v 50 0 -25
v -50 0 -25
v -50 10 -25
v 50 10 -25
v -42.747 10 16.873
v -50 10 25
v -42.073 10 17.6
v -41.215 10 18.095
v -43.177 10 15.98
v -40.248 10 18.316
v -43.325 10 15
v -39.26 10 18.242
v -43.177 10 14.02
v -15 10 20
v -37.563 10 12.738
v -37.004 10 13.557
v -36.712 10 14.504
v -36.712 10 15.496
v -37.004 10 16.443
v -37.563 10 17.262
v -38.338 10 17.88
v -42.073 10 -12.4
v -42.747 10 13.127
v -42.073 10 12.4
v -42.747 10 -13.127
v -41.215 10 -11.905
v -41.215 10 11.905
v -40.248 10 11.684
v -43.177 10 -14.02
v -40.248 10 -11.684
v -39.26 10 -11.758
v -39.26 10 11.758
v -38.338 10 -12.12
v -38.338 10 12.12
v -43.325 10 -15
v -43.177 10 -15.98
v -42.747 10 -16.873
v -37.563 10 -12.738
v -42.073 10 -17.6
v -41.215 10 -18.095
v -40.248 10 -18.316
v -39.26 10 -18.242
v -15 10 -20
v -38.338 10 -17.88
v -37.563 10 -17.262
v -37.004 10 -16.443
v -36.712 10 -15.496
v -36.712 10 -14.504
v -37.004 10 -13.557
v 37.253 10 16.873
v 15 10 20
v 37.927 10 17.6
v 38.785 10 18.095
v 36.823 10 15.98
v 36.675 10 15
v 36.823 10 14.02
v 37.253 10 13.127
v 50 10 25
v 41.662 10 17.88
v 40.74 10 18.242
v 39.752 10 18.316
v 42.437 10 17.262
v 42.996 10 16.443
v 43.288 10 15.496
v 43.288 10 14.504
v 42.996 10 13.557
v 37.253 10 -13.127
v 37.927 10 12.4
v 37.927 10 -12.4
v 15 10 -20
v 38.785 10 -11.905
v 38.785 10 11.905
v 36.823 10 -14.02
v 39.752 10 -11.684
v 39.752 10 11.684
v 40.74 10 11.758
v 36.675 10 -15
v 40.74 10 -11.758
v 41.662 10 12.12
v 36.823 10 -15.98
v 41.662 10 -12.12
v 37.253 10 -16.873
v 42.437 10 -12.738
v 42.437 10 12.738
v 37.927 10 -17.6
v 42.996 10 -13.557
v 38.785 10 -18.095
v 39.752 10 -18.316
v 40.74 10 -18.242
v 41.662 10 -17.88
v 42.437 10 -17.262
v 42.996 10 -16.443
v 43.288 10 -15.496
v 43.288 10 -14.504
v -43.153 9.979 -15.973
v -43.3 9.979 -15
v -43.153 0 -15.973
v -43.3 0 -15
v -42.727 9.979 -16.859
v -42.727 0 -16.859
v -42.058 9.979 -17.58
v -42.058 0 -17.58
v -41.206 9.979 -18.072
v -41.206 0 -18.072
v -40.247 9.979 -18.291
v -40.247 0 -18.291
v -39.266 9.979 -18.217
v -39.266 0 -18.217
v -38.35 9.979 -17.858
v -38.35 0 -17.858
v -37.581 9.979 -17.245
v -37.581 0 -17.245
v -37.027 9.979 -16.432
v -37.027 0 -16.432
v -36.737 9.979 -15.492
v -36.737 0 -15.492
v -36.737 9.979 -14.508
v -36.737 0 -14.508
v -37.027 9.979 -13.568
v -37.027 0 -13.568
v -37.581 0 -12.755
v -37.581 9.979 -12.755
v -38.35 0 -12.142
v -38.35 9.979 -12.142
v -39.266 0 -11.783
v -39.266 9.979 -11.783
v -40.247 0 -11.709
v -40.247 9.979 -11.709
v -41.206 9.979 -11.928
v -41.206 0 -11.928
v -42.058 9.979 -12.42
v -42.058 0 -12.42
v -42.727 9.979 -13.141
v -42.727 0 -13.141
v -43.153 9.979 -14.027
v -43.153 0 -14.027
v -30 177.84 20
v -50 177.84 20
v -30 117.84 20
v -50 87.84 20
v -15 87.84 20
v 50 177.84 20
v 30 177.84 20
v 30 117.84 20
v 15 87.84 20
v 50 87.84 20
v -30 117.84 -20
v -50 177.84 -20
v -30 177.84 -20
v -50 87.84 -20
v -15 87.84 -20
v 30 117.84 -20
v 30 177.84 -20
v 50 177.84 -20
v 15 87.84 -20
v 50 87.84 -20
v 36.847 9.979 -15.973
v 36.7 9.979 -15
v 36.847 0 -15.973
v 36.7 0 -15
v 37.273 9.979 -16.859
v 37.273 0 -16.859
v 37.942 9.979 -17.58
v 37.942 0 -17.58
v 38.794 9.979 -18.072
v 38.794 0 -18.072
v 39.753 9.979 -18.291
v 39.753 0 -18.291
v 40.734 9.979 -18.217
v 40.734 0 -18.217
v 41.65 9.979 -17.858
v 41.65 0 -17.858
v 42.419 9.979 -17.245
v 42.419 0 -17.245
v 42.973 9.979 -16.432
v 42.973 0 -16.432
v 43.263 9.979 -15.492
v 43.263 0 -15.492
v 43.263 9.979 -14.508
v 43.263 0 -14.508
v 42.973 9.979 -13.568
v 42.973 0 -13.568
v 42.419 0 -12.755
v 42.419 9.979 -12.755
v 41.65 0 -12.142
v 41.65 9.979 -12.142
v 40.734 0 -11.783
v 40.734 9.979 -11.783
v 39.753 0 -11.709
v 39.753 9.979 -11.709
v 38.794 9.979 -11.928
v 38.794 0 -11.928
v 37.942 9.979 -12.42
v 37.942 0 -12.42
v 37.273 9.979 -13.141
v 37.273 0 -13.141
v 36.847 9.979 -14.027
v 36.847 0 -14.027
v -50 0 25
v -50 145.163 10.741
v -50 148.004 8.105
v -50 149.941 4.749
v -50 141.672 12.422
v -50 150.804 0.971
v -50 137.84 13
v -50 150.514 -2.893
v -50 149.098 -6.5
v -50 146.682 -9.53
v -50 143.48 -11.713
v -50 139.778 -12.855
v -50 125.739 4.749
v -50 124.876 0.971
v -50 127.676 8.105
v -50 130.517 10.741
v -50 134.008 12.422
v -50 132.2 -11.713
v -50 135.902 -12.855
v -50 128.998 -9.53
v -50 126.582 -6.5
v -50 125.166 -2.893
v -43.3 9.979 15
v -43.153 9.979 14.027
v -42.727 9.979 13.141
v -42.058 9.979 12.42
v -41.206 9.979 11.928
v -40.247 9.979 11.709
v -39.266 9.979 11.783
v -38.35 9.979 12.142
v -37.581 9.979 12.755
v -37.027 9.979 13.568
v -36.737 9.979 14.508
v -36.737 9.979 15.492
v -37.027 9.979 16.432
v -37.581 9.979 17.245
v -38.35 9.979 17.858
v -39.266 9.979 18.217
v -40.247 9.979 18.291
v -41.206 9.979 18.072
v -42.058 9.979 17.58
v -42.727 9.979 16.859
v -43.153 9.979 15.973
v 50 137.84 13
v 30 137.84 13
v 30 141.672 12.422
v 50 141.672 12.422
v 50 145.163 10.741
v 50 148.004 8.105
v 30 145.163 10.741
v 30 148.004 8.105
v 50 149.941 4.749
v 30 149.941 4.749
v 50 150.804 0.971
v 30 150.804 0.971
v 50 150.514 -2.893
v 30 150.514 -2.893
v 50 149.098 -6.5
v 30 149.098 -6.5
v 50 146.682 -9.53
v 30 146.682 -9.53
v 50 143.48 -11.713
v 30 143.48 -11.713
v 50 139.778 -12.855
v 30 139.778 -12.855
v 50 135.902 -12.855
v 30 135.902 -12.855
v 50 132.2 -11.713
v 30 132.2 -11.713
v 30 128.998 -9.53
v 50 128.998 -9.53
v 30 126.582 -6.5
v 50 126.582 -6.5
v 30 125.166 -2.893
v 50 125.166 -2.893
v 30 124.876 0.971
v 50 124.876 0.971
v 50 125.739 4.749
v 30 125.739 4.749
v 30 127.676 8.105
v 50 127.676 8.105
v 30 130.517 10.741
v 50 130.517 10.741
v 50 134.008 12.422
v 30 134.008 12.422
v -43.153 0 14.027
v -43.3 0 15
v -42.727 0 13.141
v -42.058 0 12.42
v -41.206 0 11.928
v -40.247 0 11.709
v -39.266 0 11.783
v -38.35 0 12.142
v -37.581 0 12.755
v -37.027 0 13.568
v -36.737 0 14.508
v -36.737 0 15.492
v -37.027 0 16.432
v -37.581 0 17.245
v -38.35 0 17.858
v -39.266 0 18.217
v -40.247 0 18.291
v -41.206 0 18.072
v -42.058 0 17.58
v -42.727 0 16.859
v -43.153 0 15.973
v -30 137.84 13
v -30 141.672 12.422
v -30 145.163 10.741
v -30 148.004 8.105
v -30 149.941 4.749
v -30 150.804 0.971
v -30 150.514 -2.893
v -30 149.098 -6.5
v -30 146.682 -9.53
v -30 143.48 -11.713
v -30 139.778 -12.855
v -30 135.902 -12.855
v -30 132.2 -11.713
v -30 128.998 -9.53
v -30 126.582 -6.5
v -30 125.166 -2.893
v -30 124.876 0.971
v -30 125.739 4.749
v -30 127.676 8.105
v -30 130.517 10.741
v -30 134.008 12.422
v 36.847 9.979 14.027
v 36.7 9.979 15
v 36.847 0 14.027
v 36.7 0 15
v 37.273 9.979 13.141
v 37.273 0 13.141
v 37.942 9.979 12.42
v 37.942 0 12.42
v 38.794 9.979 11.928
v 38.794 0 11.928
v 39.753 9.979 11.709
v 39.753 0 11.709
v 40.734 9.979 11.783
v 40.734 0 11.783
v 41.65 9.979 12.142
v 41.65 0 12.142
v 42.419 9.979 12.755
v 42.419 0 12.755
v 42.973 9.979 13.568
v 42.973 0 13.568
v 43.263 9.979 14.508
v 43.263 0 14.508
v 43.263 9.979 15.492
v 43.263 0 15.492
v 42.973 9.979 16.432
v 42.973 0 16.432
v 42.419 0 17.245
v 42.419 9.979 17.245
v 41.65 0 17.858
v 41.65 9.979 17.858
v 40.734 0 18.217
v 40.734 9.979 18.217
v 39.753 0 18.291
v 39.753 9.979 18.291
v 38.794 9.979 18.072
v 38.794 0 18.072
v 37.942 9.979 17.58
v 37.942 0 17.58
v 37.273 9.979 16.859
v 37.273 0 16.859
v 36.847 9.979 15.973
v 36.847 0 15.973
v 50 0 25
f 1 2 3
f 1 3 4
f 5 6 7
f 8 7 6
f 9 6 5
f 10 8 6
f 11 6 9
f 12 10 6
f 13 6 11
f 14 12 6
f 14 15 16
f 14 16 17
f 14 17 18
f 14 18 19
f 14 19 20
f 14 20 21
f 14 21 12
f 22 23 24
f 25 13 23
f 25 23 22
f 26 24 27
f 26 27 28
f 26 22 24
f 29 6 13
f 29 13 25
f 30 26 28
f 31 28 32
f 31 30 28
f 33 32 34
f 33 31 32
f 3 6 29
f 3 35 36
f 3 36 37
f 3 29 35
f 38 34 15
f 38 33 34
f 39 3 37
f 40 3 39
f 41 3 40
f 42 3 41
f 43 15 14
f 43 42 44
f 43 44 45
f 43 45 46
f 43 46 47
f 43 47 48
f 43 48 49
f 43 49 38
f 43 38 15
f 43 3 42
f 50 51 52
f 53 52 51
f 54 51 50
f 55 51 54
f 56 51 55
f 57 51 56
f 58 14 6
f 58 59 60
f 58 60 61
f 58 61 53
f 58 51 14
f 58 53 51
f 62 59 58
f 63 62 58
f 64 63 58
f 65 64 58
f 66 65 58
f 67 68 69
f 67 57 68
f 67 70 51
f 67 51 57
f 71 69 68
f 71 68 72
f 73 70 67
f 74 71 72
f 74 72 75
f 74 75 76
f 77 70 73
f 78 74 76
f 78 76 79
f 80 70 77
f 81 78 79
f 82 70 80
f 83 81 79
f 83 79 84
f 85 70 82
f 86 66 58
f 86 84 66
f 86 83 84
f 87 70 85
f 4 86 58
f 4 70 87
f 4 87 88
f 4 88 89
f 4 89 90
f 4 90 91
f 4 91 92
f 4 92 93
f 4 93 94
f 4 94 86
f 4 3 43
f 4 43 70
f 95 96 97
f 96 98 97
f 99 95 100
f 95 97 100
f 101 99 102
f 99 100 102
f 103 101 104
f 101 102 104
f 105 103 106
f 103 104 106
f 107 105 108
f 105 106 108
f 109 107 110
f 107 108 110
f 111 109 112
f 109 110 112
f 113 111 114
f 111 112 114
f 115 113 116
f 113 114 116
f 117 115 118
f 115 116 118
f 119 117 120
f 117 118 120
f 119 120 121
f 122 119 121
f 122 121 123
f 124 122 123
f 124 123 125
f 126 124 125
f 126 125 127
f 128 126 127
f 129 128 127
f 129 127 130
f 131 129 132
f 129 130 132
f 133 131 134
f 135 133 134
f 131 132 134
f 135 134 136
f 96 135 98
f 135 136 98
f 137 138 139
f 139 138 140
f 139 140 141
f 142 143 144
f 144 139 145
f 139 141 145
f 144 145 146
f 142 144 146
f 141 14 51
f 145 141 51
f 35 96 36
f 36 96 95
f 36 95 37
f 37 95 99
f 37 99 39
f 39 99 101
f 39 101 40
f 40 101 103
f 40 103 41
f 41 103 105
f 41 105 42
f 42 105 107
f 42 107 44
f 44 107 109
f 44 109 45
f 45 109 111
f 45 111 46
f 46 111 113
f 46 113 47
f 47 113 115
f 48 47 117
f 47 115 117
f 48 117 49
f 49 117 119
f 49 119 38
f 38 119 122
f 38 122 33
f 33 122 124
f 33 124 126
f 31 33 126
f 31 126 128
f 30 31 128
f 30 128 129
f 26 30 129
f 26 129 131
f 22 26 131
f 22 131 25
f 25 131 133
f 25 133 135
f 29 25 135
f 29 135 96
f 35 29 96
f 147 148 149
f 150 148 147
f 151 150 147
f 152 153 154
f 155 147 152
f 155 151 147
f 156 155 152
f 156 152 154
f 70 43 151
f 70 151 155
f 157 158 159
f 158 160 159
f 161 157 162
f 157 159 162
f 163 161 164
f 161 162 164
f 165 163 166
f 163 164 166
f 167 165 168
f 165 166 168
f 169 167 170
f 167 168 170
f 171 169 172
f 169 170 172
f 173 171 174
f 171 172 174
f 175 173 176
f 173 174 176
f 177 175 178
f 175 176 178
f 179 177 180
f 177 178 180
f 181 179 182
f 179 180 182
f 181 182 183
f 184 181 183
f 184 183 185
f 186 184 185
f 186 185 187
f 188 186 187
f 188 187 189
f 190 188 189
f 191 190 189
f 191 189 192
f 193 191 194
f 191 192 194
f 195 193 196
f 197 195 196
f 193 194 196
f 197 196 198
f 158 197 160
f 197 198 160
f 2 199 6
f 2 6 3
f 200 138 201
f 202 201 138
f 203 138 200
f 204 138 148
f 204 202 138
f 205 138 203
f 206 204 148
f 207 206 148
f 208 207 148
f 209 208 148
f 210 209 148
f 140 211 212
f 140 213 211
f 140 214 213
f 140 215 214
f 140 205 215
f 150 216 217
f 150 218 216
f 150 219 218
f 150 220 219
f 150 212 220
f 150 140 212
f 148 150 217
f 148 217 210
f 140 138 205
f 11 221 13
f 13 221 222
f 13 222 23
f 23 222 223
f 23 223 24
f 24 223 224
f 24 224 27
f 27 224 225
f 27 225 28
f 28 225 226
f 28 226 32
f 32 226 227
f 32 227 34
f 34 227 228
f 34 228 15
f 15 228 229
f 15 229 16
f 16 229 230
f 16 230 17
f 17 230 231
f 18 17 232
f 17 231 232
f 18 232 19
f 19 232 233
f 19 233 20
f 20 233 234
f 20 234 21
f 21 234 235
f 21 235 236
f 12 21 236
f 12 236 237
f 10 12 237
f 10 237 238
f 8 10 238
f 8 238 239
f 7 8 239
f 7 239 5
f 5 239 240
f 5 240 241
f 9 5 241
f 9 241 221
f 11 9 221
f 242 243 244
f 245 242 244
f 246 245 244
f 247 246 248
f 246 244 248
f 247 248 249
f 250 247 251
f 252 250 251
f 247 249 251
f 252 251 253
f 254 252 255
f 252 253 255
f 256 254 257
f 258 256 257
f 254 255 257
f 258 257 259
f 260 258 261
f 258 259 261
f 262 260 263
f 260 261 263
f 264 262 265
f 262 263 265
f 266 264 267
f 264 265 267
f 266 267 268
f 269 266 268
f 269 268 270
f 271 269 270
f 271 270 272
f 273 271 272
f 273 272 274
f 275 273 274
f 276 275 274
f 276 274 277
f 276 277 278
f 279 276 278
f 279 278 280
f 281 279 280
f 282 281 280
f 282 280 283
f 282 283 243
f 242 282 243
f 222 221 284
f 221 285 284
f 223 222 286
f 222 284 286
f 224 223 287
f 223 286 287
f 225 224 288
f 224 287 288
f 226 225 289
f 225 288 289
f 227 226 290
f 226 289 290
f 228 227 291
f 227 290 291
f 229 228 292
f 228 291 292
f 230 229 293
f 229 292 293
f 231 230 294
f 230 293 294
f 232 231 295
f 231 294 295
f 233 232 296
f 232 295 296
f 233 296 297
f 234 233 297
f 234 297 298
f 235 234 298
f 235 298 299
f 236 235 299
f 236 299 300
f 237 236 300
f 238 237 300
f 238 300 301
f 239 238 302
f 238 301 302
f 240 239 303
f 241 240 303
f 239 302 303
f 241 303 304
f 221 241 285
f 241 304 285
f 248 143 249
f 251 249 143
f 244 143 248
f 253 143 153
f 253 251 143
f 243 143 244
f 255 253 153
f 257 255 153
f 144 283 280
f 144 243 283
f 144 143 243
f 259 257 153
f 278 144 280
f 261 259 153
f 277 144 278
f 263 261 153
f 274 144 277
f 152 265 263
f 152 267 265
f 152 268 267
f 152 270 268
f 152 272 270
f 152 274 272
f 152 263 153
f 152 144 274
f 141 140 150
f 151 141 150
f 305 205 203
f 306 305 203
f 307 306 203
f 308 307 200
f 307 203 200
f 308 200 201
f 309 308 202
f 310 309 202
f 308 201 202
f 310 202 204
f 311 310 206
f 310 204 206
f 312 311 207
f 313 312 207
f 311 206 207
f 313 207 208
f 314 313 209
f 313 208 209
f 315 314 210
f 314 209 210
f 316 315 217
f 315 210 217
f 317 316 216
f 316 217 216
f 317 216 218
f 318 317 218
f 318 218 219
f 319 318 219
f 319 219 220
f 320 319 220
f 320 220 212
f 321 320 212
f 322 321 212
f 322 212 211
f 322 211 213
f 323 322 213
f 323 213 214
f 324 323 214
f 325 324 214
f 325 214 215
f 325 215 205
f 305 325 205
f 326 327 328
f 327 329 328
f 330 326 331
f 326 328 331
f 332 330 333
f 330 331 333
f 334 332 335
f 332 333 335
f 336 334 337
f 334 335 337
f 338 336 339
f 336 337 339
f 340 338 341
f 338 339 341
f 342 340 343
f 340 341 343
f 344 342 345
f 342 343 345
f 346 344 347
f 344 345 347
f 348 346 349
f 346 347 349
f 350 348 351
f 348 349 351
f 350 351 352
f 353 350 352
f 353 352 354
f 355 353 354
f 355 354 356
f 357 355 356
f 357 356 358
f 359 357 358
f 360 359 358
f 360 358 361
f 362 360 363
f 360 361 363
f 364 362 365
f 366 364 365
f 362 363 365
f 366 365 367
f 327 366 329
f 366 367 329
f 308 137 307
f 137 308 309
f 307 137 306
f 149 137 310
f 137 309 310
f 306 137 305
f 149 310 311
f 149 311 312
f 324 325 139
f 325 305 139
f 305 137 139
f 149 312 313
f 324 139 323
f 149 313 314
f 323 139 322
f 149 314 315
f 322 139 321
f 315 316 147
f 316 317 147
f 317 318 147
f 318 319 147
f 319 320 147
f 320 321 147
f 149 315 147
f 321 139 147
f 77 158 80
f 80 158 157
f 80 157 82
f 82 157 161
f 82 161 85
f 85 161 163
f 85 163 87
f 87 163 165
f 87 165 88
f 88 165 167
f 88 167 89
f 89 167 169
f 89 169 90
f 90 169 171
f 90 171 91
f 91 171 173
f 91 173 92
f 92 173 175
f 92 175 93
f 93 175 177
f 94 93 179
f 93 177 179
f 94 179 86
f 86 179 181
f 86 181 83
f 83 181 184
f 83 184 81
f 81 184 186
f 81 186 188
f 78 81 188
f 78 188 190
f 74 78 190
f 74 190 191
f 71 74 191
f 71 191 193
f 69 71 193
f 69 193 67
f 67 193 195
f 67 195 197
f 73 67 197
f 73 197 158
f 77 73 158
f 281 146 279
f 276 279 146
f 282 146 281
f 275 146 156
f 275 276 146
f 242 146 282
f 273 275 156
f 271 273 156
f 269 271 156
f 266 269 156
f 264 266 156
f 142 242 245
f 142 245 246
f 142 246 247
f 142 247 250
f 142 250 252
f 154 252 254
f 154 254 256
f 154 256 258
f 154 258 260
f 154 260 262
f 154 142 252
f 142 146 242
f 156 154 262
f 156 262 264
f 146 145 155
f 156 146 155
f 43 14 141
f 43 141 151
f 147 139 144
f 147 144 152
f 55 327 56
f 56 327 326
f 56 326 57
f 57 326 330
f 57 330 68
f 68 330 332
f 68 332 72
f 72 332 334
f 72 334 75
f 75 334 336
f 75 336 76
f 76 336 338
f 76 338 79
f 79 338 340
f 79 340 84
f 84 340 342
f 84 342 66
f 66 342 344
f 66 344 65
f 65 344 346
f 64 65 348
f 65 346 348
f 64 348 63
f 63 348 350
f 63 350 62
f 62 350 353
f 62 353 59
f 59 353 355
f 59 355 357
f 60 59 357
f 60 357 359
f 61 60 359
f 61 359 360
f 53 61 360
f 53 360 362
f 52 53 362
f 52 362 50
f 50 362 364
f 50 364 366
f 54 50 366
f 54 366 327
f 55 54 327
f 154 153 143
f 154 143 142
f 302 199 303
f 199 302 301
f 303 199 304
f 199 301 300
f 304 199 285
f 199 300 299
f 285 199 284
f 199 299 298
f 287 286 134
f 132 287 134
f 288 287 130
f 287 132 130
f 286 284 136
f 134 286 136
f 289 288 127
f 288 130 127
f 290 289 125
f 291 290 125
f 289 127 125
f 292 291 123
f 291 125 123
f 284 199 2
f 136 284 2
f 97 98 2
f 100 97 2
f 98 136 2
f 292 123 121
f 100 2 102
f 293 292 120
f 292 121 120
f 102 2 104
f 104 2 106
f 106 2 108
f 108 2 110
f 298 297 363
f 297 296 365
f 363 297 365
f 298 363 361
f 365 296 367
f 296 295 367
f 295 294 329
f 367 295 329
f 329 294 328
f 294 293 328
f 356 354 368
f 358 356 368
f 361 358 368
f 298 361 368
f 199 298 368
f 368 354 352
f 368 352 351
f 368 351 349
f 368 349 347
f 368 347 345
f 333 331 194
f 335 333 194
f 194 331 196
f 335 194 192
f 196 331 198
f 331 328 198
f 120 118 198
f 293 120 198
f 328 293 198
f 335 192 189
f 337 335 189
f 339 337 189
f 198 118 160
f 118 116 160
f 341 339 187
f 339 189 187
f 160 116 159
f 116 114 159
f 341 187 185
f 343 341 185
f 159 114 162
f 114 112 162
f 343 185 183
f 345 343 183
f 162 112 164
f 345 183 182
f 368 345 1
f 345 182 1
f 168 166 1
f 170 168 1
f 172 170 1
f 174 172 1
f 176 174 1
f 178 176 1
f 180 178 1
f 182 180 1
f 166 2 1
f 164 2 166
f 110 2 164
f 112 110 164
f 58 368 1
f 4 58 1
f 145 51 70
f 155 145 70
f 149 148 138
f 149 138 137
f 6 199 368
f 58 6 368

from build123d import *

# Parameters (mm, degrees)
SKETCH1_W                      = 100
SKETCH1_H                      = 50
BOSS_EXTRUDE1_DEPTH            = 10
M6_CLEARANCE_HOLE1_D           = 6.6
M6_CLEARANCE_HOLE1_CSINK_D     = 6.65
M6_CLEARANCE_HOLE1_CSINK_ANGLE = 100
SKETCH4_W                      = 30
SKETCH4_H                      = 40
BOSS_EXTRUDE2_DEPTH            = 107.84
BOSS_EXTRUDE3_DEPTH            = 50
BOSS_EXTRUDE3_DEPTH_BACK       = 50
SKETCH6_W                      = 40
SKETCH6_H                      = 30
SKETCH7_W                      = 20
SKETCH7_H                      = 40
BOSS_EXTRUDE4_DEPTH            = 60
SKETCH8_R                      = 13
CUT_EXTRUDE3_DEPTH             = 206.553072465


with BuildPart() as part:
    # Sketch1 → Boss-Extrude1 (new body)
    with BuildSketch(Plane(origin=(0, 0, 0), x_dir=(1, 0, 0), z_dir=(0, 1, 0))):
        Rectangle(SKETCH1_W, SKETCH1_H)
    extrude(amount=BOSS_EXTRUDE1_DEPTH)

    # M6 Clearance Hole1 (through all)
    with Locations(Plane(origin=(0, 10, 0), x_dir=(1, 0, 0), z_dir=(0, 1, 0))):
        with Locations((-40, 15), (40, 15), (-40, -15), (40, -15)):
            CounterSinkHole(M6_CLEARANCE_HOLE1_D / 2, M6_CLEARANCE_HOLE1_CSINK_D / 2, counter_sink_angle=M6_CLEARANCE_HOLE1_CSINK_ANGLE)

    # Sketch4 → Boss-Extrude2 (add)
    with BuildSketch(Plane(origin=(0, 10, 0), x_dir=(1, 0, 0), z_dir=(0, 1, 0))):
        Rectangle(SKETCH4_W, SKETCH4_H)
    extrude(amount=BOSS_EXTRUDE2_DEPTH)

    # Sketch6 → Boss-Extrude3 (add, two sides: drawn at the far end of the back side and taken through both)
    with BuildSketch(Plane(origin=(0, 0, 0), x_dir=(0, 0, -1), z_dir=(1, 0, 0)).offset(-BOSS_EXTRUDE3_DEPTH_BACK)):
        with Locations((0, 102.84)):
            Rectangle(SKETCH6_W, SKETCH6_H)
    extrude(amount=BOSS_EXTRUDE3_DEPTH + BOSS_EXTRUDE3_DEPTH_BACK)

    # Sketch7 → Boss-Extrude4 (add)
    with BuildSketch(Plane(origin=(0, 117.84, 0), x_dir=(1, 0, 0), z_dir=(0, 1, 0))):
        with Locations((-40, 0)):
            Rectangle(SKETCH7_W, SKETCH7_H)
        with Locations((40, 0)):
            Rectangle(SKETCH7_W, SKETCH7_H)
    extrude(amount=BOSS_EXTRUDE4_DEPTH)

    # Sketch8 → Cut-Extrude3 (cut, through all)
    with BuildSketch(Plane.ZY.offset(50)):
        with Locations((0, 137.84)):
            Circle(SKETCH8_R)
    extrude(amount=-CUT_EXTRUDE3_DEPTH, mode=Mode.SUBTRACT)


solid = part.part
